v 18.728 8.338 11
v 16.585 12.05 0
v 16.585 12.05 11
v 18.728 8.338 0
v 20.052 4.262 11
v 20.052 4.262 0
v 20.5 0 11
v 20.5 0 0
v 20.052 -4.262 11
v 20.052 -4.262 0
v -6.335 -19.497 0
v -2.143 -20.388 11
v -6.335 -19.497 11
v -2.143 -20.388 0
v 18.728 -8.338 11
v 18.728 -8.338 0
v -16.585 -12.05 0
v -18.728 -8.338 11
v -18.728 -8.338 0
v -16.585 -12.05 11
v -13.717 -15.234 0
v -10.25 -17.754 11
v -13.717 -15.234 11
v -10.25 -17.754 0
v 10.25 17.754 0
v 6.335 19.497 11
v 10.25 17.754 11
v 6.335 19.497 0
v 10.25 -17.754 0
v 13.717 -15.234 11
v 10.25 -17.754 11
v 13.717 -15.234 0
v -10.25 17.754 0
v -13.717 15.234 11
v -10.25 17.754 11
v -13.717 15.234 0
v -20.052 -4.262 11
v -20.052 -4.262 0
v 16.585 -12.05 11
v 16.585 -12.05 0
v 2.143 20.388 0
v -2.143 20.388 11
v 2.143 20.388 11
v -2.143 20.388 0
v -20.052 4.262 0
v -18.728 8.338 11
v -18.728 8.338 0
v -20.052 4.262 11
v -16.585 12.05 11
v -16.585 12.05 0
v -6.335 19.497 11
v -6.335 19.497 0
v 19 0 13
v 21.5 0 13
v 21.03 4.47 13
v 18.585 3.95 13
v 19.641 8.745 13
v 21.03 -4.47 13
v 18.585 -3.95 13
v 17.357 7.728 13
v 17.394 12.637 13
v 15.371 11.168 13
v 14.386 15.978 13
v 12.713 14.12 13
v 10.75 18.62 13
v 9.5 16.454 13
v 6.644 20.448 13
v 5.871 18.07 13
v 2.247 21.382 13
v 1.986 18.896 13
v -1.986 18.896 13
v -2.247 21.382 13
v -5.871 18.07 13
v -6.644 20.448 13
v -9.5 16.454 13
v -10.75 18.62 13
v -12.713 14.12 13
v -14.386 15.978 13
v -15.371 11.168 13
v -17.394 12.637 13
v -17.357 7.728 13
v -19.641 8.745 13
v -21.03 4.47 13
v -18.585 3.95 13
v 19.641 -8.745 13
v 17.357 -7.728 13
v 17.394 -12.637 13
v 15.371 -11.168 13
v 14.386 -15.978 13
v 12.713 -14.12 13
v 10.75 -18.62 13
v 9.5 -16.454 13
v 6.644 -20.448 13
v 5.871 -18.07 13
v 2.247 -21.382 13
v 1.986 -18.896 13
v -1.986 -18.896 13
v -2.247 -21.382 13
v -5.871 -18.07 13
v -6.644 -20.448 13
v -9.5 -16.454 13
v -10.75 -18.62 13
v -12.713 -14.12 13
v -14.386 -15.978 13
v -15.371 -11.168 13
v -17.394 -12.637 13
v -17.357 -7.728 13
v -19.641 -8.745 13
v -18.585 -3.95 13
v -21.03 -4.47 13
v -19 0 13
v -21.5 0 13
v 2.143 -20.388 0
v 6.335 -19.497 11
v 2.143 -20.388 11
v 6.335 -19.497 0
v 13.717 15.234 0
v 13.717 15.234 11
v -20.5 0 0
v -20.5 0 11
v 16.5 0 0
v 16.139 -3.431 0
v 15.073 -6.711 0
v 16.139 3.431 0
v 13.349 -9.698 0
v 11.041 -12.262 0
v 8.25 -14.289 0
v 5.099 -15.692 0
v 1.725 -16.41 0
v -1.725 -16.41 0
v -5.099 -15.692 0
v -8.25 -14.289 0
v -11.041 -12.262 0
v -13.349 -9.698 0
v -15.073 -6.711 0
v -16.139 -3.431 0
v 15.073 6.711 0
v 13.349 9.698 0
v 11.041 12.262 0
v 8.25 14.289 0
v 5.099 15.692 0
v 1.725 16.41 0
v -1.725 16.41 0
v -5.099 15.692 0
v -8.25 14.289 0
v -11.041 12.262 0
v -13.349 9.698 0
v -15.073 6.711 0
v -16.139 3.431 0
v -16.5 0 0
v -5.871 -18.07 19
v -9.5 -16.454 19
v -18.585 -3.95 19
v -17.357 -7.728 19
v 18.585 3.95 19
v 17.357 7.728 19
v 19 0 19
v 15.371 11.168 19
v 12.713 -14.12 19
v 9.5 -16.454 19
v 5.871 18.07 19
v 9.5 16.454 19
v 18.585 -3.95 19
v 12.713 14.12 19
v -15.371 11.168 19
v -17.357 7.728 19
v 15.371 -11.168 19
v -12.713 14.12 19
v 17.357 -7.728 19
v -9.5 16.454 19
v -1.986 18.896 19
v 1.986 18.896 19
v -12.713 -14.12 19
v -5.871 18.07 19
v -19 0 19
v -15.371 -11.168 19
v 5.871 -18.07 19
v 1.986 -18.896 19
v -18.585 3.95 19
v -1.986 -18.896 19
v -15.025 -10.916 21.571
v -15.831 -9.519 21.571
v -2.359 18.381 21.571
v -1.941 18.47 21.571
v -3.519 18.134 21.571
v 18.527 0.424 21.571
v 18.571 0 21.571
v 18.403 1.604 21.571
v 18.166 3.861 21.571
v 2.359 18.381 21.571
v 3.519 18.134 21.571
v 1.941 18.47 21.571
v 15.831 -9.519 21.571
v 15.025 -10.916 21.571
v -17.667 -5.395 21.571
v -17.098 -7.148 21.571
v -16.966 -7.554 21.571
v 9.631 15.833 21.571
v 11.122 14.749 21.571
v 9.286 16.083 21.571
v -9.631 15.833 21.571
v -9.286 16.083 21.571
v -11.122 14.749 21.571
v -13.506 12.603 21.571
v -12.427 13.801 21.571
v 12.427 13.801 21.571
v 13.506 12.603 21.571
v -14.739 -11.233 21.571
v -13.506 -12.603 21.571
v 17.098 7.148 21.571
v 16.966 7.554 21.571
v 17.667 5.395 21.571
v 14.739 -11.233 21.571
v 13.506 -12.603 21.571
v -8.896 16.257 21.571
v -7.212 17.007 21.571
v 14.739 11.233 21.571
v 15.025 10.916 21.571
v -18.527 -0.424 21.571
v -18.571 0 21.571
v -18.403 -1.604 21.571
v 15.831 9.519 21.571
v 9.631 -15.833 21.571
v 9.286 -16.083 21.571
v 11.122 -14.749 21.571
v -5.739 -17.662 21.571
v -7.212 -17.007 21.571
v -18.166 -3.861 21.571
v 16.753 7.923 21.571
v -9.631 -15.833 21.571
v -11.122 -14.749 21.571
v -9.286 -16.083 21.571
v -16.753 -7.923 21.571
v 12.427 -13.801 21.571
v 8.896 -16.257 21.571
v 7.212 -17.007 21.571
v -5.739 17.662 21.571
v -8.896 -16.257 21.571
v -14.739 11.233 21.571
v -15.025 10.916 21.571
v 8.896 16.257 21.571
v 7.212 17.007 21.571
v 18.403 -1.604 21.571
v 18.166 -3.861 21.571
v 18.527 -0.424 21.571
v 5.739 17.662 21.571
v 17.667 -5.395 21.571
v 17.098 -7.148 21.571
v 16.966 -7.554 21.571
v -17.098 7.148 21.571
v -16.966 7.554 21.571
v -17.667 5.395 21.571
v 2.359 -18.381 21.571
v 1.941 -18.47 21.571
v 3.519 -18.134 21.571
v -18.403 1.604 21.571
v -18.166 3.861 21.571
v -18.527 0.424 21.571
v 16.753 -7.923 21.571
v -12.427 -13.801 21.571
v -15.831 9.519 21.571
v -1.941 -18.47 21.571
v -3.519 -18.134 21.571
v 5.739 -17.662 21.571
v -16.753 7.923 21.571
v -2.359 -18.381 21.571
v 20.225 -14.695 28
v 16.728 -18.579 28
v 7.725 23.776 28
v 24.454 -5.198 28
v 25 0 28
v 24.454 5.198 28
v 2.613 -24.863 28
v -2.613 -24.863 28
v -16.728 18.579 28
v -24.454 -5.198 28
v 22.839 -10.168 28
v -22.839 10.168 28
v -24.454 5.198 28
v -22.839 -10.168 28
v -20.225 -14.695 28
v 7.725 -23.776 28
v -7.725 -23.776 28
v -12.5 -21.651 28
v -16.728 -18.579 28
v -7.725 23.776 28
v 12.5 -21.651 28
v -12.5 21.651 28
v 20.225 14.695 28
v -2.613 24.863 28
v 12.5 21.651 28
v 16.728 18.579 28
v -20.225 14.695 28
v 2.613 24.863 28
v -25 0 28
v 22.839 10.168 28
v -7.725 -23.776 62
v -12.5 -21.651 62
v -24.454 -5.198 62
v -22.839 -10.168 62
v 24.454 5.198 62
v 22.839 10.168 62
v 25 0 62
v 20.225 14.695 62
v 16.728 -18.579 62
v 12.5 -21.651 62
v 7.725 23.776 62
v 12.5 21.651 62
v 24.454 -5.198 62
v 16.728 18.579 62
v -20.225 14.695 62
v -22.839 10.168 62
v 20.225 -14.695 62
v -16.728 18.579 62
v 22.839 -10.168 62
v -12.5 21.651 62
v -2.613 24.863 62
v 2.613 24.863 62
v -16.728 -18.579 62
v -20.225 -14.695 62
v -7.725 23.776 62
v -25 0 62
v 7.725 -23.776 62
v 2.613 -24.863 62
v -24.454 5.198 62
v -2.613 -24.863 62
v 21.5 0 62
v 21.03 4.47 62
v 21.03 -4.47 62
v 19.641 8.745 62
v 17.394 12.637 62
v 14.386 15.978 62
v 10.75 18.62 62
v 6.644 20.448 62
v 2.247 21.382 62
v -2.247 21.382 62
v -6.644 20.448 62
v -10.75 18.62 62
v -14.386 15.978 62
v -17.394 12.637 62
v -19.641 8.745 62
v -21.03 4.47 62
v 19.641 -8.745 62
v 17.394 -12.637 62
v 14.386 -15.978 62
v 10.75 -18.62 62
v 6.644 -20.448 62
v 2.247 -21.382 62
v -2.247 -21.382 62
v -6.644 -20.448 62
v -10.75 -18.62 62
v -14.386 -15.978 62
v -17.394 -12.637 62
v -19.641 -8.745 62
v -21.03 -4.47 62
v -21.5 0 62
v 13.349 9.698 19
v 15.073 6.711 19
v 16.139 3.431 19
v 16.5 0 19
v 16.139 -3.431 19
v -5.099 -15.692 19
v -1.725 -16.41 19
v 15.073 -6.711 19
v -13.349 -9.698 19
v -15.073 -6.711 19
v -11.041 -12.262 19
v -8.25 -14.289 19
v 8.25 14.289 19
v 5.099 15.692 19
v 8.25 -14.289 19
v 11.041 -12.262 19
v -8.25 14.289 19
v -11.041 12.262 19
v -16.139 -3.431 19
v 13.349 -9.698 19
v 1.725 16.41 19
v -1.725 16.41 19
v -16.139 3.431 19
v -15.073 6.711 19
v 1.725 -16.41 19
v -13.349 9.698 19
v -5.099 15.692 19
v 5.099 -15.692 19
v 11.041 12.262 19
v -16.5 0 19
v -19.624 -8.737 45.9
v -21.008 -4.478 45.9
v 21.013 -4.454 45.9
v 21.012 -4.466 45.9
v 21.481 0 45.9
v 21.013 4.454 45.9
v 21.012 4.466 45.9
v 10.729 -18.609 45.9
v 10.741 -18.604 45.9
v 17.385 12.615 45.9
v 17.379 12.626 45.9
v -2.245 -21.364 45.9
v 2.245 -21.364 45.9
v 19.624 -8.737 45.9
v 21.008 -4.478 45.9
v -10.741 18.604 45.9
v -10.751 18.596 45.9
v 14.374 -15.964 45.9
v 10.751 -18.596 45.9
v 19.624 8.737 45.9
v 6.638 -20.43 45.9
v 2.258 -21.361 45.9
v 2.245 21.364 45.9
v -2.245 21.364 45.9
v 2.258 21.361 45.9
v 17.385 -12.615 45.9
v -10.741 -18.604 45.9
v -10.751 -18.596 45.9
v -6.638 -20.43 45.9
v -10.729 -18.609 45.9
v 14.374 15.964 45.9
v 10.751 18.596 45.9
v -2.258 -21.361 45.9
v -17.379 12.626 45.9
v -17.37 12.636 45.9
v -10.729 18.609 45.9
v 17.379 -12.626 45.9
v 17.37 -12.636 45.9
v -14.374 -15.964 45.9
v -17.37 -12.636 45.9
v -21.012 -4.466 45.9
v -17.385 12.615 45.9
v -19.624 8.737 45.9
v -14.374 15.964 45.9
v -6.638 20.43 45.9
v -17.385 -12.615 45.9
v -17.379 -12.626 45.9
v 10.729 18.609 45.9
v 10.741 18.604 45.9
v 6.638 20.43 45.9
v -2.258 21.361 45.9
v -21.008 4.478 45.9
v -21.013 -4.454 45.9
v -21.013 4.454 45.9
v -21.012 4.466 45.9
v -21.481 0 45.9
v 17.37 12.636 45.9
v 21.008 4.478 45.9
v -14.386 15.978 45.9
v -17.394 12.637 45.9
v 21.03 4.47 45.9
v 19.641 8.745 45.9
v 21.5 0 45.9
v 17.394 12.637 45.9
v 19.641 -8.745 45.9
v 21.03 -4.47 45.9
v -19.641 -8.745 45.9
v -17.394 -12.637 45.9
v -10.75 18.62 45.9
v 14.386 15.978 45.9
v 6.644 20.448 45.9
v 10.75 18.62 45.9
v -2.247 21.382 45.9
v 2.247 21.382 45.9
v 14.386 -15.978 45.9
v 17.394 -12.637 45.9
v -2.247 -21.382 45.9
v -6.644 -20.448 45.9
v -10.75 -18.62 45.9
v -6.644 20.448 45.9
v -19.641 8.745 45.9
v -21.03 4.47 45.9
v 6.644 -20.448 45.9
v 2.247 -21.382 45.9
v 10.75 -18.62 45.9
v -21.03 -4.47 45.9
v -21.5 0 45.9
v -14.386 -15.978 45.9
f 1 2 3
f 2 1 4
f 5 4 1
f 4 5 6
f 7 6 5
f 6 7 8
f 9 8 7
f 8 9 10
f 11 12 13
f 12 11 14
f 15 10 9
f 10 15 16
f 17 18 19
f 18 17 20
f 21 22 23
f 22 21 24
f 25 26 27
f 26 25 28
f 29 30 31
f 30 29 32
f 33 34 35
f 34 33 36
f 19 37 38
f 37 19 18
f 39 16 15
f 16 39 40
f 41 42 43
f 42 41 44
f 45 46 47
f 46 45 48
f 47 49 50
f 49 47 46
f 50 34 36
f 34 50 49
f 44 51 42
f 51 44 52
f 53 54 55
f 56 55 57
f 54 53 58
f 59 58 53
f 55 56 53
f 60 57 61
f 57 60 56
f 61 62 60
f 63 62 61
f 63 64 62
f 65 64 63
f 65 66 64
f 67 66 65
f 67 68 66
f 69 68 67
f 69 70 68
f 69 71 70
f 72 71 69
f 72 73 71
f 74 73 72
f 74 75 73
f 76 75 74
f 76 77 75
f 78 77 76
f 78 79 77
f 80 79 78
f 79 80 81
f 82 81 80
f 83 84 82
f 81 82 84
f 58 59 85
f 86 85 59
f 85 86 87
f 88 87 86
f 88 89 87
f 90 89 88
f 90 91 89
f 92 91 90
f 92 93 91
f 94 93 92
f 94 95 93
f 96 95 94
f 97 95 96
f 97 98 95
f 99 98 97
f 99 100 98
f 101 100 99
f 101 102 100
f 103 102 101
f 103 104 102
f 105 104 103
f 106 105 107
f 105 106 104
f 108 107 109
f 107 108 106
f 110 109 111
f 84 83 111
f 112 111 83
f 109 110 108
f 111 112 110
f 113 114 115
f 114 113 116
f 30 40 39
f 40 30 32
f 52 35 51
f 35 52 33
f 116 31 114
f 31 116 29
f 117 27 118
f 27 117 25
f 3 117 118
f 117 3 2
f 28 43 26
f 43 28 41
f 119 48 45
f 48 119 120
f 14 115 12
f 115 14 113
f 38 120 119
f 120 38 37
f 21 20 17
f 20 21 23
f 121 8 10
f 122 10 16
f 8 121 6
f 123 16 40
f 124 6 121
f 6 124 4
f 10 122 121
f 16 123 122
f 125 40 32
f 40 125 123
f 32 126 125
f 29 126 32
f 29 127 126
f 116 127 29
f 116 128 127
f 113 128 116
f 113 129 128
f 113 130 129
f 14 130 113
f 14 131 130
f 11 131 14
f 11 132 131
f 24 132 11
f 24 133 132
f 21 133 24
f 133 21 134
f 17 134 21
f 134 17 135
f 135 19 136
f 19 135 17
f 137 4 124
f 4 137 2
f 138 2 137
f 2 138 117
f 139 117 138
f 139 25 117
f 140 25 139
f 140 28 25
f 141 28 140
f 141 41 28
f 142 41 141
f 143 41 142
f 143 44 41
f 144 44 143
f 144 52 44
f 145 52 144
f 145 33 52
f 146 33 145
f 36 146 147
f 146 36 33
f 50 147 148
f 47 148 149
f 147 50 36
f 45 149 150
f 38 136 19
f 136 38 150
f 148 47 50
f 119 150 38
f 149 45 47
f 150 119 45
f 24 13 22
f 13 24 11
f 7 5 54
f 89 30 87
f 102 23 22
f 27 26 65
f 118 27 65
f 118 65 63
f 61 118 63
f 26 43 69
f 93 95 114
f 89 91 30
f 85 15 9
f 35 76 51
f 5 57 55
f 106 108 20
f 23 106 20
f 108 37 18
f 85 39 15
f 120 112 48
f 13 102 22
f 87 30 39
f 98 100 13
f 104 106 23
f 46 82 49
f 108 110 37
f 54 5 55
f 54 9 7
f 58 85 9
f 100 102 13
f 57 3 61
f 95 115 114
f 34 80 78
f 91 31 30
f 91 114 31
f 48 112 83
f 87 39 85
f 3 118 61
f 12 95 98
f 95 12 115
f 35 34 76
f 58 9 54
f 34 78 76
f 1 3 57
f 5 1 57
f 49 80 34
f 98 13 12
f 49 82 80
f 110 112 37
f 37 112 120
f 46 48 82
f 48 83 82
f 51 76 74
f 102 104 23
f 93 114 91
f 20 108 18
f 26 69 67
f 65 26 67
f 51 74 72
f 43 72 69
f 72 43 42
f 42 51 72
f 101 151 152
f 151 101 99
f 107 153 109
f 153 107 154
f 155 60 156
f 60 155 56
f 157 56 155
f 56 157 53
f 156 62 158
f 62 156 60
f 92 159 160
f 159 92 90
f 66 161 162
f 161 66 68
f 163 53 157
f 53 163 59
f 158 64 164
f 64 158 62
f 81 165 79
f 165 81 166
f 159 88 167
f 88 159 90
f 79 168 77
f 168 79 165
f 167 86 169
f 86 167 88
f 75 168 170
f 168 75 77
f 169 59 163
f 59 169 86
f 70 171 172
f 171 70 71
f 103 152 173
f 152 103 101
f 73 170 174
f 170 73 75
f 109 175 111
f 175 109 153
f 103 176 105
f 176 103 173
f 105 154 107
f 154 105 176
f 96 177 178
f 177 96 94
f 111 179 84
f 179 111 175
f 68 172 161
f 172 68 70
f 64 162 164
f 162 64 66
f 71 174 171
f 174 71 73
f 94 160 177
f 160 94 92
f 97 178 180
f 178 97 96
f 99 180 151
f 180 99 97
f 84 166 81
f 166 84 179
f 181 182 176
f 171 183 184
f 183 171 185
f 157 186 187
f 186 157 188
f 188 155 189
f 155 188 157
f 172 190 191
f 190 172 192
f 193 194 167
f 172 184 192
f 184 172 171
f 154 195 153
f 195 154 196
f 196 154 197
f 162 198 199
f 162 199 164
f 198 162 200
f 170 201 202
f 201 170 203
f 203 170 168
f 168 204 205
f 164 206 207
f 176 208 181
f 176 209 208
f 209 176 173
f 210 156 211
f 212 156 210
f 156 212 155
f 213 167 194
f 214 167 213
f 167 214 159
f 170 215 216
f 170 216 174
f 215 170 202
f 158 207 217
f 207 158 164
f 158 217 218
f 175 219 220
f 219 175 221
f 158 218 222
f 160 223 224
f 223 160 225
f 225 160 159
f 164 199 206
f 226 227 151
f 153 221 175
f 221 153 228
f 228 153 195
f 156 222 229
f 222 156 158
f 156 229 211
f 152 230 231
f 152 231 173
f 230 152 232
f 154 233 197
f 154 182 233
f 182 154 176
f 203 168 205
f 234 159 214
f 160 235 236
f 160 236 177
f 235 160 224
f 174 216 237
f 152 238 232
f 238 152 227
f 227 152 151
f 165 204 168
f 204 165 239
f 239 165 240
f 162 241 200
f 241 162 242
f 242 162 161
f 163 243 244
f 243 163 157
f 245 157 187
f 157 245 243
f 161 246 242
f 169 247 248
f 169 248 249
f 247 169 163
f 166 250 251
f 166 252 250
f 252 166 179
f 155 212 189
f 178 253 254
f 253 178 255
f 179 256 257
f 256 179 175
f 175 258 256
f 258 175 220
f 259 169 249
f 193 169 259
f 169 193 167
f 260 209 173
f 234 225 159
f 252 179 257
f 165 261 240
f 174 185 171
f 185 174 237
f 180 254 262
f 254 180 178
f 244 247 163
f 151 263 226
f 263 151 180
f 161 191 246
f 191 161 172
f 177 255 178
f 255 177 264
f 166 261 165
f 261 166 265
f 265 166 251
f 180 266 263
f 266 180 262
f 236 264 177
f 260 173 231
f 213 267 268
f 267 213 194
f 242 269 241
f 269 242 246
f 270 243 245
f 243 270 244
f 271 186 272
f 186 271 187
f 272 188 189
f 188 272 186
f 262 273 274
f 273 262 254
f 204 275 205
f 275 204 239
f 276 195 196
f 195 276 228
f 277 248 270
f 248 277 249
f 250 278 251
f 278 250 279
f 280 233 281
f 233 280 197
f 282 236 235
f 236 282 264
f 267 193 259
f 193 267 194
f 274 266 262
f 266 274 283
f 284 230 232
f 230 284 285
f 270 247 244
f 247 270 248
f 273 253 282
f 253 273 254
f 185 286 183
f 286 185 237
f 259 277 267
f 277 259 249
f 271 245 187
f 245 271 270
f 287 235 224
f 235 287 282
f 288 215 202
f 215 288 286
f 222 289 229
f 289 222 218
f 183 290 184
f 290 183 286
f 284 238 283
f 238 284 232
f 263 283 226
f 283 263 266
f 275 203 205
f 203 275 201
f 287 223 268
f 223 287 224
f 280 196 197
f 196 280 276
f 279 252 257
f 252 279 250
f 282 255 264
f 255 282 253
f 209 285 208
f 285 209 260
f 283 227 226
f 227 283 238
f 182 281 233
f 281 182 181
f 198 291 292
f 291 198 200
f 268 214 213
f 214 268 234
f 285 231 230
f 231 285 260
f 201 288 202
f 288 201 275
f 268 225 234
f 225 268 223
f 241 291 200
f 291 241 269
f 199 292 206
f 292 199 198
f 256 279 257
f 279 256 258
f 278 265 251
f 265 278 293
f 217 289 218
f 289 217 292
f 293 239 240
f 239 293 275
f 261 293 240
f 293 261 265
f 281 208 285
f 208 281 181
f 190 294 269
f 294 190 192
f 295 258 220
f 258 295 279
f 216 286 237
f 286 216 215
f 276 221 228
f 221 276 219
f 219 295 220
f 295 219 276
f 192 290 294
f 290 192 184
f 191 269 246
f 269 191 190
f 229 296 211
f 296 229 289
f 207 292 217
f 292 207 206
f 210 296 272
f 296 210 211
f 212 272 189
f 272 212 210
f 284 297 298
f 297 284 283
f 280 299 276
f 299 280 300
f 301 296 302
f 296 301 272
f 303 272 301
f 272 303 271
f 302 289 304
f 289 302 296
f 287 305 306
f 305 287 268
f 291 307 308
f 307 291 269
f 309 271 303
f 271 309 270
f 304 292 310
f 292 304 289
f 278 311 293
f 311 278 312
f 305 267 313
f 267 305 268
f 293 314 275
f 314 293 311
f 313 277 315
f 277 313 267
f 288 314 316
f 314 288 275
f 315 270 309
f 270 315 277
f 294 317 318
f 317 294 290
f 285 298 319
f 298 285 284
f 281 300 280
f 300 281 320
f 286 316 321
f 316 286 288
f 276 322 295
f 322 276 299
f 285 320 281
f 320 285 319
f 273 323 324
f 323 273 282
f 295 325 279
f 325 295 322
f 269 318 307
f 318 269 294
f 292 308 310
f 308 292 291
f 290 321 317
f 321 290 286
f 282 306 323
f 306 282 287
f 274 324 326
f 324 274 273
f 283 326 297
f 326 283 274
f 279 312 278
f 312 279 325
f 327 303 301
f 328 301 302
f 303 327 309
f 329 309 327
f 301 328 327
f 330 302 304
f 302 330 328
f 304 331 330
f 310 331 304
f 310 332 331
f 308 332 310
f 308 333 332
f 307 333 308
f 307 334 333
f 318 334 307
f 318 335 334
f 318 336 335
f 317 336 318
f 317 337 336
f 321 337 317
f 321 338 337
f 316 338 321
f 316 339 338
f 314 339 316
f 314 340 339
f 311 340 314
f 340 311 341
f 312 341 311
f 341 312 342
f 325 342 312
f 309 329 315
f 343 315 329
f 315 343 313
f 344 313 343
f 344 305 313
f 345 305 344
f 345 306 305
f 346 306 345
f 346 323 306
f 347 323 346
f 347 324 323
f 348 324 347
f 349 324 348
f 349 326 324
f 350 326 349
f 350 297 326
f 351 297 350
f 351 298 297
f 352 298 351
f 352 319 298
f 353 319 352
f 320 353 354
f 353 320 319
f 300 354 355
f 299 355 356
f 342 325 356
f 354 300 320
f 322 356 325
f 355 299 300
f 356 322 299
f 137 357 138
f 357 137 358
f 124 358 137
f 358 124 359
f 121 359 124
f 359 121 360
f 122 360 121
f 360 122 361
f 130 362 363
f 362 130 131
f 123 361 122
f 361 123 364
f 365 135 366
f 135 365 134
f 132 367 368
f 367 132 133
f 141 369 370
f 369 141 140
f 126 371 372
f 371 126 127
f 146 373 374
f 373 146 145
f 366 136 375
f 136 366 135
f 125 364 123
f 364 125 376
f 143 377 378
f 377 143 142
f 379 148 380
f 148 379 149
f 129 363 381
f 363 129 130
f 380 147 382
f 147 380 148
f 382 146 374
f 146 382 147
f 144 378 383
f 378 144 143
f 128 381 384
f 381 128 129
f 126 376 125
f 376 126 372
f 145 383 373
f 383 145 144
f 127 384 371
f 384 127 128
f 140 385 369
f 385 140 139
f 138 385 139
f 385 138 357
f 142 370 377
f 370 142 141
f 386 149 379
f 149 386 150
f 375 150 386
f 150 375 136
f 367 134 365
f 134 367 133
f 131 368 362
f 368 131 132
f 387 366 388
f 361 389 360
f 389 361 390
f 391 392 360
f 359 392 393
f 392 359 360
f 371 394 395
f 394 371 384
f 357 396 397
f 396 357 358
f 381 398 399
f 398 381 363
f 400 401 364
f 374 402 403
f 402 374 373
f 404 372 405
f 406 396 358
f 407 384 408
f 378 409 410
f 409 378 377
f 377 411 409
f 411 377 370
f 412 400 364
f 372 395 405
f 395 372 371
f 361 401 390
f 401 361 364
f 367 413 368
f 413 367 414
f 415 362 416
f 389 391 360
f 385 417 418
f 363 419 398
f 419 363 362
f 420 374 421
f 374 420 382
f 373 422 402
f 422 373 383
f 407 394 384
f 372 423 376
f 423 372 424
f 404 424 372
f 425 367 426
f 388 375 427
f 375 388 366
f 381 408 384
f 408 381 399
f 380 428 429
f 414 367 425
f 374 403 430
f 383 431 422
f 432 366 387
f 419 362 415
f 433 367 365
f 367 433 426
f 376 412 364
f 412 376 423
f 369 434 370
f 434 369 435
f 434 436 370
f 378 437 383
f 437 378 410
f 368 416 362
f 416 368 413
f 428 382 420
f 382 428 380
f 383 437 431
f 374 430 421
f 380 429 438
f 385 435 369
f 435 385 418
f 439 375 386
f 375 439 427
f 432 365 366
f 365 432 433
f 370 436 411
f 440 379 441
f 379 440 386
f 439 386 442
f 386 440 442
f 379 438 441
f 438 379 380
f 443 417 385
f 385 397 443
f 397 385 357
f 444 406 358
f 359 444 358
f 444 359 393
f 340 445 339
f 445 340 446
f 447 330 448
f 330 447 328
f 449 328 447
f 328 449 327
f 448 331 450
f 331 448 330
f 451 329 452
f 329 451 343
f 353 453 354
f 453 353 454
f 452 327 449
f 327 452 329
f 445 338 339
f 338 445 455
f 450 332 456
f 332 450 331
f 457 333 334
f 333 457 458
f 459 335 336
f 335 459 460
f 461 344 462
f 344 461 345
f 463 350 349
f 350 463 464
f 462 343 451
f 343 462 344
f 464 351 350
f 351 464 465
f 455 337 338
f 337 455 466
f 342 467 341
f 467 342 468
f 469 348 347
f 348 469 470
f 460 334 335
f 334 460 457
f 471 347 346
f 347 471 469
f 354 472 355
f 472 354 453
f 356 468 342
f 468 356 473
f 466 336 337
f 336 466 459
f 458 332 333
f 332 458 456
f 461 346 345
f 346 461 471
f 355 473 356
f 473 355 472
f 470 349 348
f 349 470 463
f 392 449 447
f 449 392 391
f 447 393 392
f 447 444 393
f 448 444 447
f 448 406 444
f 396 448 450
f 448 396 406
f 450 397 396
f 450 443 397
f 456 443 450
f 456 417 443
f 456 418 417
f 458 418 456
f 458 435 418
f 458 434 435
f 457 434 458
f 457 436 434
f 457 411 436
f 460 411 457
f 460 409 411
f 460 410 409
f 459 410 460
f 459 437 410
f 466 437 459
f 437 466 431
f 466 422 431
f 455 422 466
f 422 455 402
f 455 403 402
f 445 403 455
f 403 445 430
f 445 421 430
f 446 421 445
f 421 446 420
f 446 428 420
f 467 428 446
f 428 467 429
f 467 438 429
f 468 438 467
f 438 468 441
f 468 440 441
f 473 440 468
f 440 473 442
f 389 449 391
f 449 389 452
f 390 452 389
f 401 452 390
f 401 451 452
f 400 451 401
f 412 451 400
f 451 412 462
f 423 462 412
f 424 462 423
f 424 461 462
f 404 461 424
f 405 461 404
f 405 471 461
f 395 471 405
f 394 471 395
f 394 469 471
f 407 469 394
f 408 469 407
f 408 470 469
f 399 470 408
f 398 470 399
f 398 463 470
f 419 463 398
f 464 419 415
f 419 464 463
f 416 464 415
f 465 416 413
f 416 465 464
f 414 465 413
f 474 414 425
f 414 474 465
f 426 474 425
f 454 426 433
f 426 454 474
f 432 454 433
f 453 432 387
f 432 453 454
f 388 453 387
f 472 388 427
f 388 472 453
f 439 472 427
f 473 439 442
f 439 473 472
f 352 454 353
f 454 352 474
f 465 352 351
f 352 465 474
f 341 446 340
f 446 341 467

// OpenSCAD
module vax_end(){    
    translate([0,0,0]){
        cylinder(13,41/2,41/2);
    }
    translate([0,0,11]){
        cylinder(2,41/2,43/2);  
    }
    translate([0,0,13]){
        cylinder(6,38/2,38/2);  
    }
    translate([0,0,19]){
        cylinder(6,38/2,36/2);  
    }
    translate([0,0,21]){
        cylinder(7,36/2,50/2);
    } 
    translate([0,0,28]){
        cylinder(17,50/2,50/2);
    }  
    translate([0,0,28+17]){
        cylinder(17,50/2,50/2);
    }  
}
difference(){
    vax_end(); 
    translate([0,0,-1]){ 
        cylinder(28,33/2,33/2); 
    }
    translate([0,0,19]){ 
        cylinder(27,33/2,43/2); 
    }
    translate([0,0,19+26.9]){ 
        cylinder(27,43/2,43/2); 
    }
    translate([0,-50,-10]){ 
        //cube([100,100,100]);
    }
}
